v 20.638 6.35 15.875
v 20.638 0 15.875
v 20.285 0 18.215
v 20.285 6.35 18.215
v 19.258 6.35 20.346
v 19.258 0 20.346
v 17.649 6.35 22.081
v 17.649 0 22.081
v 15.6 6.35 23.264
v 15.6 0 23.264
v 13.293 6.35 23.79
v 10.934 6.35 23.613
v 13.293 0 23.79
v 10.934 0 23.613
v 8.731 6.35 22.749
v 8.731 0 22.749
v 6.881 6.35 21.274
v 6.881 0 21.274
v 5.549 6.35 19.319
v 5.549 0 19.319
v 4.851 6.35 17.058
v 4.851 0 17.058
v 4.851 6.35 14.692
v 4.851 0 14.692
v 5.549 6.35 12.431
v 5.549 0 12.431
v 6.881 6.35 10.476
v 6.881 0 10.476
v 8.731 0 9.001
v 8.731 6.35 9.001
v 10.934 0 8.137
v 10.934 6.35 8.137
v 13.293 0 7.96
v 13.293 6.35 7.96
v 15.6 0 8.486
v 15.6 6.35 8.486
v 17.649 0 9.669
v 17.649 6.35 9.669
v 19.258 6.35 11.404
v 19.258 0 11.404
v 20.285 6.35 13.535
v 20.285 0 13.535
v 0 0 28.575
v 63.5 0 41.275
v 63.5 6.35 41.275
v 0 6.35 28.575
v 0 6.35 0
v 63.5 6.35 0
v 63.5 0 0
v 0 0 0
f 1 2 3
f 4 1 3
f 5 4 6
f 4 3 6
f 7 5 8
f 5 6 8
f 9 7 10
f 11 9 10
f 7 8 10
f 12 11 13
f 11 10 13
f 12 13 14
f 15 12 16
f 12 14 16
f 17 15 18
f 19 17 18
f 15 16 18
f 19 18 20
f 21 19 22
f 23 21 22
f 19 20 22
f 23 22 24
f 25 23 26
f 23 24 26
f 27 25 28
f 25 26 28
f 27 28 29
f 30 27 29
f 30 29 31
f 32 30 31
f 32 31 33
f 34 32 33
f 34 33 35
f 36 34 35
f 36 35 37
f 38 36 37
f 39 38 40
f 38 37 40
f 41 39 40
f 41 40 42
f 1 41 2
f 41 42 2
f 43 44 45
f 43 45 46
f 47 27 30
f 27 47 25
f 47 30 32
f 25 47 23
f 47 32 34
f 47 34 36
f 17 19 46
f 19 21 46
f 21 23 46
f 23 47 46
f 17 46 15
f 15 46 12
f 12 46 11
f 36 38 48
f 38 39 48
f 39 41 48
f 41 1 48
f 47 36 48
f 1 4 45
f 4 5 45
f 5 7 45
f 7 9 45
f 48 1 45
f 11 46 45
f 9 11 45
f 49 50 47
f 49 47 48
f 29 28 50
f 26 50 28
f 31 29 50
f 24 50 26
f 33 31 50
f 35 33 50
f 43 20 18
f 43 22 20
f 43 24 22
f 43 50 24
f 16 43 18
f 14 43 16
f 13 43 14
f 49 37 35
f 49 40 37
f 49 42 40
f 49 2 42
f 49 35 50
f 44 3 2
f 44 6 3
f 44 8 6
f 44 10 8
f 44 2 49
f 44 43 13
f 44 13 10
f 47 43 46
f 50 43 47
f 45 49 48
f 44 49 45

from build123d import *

# Parameters (mm, degrees)
F0_R     = 7.9375
F1_DEPTH = 6.35


with BuildPart() as f1:
    # F0 (on Front) → F1 (new body)
    with BuildSketch(Plane.XZ):
        Polygon((63.5, 0), (63.5, 41.275), (0, 28.575), (0, 0), align=None)
        with Locations((12.7, 15.875)):
            Circle(F0_R, mode=Mode.SUBTRACT)
    extrude(amount=-F1_DEPTH)


solid = f1.part
